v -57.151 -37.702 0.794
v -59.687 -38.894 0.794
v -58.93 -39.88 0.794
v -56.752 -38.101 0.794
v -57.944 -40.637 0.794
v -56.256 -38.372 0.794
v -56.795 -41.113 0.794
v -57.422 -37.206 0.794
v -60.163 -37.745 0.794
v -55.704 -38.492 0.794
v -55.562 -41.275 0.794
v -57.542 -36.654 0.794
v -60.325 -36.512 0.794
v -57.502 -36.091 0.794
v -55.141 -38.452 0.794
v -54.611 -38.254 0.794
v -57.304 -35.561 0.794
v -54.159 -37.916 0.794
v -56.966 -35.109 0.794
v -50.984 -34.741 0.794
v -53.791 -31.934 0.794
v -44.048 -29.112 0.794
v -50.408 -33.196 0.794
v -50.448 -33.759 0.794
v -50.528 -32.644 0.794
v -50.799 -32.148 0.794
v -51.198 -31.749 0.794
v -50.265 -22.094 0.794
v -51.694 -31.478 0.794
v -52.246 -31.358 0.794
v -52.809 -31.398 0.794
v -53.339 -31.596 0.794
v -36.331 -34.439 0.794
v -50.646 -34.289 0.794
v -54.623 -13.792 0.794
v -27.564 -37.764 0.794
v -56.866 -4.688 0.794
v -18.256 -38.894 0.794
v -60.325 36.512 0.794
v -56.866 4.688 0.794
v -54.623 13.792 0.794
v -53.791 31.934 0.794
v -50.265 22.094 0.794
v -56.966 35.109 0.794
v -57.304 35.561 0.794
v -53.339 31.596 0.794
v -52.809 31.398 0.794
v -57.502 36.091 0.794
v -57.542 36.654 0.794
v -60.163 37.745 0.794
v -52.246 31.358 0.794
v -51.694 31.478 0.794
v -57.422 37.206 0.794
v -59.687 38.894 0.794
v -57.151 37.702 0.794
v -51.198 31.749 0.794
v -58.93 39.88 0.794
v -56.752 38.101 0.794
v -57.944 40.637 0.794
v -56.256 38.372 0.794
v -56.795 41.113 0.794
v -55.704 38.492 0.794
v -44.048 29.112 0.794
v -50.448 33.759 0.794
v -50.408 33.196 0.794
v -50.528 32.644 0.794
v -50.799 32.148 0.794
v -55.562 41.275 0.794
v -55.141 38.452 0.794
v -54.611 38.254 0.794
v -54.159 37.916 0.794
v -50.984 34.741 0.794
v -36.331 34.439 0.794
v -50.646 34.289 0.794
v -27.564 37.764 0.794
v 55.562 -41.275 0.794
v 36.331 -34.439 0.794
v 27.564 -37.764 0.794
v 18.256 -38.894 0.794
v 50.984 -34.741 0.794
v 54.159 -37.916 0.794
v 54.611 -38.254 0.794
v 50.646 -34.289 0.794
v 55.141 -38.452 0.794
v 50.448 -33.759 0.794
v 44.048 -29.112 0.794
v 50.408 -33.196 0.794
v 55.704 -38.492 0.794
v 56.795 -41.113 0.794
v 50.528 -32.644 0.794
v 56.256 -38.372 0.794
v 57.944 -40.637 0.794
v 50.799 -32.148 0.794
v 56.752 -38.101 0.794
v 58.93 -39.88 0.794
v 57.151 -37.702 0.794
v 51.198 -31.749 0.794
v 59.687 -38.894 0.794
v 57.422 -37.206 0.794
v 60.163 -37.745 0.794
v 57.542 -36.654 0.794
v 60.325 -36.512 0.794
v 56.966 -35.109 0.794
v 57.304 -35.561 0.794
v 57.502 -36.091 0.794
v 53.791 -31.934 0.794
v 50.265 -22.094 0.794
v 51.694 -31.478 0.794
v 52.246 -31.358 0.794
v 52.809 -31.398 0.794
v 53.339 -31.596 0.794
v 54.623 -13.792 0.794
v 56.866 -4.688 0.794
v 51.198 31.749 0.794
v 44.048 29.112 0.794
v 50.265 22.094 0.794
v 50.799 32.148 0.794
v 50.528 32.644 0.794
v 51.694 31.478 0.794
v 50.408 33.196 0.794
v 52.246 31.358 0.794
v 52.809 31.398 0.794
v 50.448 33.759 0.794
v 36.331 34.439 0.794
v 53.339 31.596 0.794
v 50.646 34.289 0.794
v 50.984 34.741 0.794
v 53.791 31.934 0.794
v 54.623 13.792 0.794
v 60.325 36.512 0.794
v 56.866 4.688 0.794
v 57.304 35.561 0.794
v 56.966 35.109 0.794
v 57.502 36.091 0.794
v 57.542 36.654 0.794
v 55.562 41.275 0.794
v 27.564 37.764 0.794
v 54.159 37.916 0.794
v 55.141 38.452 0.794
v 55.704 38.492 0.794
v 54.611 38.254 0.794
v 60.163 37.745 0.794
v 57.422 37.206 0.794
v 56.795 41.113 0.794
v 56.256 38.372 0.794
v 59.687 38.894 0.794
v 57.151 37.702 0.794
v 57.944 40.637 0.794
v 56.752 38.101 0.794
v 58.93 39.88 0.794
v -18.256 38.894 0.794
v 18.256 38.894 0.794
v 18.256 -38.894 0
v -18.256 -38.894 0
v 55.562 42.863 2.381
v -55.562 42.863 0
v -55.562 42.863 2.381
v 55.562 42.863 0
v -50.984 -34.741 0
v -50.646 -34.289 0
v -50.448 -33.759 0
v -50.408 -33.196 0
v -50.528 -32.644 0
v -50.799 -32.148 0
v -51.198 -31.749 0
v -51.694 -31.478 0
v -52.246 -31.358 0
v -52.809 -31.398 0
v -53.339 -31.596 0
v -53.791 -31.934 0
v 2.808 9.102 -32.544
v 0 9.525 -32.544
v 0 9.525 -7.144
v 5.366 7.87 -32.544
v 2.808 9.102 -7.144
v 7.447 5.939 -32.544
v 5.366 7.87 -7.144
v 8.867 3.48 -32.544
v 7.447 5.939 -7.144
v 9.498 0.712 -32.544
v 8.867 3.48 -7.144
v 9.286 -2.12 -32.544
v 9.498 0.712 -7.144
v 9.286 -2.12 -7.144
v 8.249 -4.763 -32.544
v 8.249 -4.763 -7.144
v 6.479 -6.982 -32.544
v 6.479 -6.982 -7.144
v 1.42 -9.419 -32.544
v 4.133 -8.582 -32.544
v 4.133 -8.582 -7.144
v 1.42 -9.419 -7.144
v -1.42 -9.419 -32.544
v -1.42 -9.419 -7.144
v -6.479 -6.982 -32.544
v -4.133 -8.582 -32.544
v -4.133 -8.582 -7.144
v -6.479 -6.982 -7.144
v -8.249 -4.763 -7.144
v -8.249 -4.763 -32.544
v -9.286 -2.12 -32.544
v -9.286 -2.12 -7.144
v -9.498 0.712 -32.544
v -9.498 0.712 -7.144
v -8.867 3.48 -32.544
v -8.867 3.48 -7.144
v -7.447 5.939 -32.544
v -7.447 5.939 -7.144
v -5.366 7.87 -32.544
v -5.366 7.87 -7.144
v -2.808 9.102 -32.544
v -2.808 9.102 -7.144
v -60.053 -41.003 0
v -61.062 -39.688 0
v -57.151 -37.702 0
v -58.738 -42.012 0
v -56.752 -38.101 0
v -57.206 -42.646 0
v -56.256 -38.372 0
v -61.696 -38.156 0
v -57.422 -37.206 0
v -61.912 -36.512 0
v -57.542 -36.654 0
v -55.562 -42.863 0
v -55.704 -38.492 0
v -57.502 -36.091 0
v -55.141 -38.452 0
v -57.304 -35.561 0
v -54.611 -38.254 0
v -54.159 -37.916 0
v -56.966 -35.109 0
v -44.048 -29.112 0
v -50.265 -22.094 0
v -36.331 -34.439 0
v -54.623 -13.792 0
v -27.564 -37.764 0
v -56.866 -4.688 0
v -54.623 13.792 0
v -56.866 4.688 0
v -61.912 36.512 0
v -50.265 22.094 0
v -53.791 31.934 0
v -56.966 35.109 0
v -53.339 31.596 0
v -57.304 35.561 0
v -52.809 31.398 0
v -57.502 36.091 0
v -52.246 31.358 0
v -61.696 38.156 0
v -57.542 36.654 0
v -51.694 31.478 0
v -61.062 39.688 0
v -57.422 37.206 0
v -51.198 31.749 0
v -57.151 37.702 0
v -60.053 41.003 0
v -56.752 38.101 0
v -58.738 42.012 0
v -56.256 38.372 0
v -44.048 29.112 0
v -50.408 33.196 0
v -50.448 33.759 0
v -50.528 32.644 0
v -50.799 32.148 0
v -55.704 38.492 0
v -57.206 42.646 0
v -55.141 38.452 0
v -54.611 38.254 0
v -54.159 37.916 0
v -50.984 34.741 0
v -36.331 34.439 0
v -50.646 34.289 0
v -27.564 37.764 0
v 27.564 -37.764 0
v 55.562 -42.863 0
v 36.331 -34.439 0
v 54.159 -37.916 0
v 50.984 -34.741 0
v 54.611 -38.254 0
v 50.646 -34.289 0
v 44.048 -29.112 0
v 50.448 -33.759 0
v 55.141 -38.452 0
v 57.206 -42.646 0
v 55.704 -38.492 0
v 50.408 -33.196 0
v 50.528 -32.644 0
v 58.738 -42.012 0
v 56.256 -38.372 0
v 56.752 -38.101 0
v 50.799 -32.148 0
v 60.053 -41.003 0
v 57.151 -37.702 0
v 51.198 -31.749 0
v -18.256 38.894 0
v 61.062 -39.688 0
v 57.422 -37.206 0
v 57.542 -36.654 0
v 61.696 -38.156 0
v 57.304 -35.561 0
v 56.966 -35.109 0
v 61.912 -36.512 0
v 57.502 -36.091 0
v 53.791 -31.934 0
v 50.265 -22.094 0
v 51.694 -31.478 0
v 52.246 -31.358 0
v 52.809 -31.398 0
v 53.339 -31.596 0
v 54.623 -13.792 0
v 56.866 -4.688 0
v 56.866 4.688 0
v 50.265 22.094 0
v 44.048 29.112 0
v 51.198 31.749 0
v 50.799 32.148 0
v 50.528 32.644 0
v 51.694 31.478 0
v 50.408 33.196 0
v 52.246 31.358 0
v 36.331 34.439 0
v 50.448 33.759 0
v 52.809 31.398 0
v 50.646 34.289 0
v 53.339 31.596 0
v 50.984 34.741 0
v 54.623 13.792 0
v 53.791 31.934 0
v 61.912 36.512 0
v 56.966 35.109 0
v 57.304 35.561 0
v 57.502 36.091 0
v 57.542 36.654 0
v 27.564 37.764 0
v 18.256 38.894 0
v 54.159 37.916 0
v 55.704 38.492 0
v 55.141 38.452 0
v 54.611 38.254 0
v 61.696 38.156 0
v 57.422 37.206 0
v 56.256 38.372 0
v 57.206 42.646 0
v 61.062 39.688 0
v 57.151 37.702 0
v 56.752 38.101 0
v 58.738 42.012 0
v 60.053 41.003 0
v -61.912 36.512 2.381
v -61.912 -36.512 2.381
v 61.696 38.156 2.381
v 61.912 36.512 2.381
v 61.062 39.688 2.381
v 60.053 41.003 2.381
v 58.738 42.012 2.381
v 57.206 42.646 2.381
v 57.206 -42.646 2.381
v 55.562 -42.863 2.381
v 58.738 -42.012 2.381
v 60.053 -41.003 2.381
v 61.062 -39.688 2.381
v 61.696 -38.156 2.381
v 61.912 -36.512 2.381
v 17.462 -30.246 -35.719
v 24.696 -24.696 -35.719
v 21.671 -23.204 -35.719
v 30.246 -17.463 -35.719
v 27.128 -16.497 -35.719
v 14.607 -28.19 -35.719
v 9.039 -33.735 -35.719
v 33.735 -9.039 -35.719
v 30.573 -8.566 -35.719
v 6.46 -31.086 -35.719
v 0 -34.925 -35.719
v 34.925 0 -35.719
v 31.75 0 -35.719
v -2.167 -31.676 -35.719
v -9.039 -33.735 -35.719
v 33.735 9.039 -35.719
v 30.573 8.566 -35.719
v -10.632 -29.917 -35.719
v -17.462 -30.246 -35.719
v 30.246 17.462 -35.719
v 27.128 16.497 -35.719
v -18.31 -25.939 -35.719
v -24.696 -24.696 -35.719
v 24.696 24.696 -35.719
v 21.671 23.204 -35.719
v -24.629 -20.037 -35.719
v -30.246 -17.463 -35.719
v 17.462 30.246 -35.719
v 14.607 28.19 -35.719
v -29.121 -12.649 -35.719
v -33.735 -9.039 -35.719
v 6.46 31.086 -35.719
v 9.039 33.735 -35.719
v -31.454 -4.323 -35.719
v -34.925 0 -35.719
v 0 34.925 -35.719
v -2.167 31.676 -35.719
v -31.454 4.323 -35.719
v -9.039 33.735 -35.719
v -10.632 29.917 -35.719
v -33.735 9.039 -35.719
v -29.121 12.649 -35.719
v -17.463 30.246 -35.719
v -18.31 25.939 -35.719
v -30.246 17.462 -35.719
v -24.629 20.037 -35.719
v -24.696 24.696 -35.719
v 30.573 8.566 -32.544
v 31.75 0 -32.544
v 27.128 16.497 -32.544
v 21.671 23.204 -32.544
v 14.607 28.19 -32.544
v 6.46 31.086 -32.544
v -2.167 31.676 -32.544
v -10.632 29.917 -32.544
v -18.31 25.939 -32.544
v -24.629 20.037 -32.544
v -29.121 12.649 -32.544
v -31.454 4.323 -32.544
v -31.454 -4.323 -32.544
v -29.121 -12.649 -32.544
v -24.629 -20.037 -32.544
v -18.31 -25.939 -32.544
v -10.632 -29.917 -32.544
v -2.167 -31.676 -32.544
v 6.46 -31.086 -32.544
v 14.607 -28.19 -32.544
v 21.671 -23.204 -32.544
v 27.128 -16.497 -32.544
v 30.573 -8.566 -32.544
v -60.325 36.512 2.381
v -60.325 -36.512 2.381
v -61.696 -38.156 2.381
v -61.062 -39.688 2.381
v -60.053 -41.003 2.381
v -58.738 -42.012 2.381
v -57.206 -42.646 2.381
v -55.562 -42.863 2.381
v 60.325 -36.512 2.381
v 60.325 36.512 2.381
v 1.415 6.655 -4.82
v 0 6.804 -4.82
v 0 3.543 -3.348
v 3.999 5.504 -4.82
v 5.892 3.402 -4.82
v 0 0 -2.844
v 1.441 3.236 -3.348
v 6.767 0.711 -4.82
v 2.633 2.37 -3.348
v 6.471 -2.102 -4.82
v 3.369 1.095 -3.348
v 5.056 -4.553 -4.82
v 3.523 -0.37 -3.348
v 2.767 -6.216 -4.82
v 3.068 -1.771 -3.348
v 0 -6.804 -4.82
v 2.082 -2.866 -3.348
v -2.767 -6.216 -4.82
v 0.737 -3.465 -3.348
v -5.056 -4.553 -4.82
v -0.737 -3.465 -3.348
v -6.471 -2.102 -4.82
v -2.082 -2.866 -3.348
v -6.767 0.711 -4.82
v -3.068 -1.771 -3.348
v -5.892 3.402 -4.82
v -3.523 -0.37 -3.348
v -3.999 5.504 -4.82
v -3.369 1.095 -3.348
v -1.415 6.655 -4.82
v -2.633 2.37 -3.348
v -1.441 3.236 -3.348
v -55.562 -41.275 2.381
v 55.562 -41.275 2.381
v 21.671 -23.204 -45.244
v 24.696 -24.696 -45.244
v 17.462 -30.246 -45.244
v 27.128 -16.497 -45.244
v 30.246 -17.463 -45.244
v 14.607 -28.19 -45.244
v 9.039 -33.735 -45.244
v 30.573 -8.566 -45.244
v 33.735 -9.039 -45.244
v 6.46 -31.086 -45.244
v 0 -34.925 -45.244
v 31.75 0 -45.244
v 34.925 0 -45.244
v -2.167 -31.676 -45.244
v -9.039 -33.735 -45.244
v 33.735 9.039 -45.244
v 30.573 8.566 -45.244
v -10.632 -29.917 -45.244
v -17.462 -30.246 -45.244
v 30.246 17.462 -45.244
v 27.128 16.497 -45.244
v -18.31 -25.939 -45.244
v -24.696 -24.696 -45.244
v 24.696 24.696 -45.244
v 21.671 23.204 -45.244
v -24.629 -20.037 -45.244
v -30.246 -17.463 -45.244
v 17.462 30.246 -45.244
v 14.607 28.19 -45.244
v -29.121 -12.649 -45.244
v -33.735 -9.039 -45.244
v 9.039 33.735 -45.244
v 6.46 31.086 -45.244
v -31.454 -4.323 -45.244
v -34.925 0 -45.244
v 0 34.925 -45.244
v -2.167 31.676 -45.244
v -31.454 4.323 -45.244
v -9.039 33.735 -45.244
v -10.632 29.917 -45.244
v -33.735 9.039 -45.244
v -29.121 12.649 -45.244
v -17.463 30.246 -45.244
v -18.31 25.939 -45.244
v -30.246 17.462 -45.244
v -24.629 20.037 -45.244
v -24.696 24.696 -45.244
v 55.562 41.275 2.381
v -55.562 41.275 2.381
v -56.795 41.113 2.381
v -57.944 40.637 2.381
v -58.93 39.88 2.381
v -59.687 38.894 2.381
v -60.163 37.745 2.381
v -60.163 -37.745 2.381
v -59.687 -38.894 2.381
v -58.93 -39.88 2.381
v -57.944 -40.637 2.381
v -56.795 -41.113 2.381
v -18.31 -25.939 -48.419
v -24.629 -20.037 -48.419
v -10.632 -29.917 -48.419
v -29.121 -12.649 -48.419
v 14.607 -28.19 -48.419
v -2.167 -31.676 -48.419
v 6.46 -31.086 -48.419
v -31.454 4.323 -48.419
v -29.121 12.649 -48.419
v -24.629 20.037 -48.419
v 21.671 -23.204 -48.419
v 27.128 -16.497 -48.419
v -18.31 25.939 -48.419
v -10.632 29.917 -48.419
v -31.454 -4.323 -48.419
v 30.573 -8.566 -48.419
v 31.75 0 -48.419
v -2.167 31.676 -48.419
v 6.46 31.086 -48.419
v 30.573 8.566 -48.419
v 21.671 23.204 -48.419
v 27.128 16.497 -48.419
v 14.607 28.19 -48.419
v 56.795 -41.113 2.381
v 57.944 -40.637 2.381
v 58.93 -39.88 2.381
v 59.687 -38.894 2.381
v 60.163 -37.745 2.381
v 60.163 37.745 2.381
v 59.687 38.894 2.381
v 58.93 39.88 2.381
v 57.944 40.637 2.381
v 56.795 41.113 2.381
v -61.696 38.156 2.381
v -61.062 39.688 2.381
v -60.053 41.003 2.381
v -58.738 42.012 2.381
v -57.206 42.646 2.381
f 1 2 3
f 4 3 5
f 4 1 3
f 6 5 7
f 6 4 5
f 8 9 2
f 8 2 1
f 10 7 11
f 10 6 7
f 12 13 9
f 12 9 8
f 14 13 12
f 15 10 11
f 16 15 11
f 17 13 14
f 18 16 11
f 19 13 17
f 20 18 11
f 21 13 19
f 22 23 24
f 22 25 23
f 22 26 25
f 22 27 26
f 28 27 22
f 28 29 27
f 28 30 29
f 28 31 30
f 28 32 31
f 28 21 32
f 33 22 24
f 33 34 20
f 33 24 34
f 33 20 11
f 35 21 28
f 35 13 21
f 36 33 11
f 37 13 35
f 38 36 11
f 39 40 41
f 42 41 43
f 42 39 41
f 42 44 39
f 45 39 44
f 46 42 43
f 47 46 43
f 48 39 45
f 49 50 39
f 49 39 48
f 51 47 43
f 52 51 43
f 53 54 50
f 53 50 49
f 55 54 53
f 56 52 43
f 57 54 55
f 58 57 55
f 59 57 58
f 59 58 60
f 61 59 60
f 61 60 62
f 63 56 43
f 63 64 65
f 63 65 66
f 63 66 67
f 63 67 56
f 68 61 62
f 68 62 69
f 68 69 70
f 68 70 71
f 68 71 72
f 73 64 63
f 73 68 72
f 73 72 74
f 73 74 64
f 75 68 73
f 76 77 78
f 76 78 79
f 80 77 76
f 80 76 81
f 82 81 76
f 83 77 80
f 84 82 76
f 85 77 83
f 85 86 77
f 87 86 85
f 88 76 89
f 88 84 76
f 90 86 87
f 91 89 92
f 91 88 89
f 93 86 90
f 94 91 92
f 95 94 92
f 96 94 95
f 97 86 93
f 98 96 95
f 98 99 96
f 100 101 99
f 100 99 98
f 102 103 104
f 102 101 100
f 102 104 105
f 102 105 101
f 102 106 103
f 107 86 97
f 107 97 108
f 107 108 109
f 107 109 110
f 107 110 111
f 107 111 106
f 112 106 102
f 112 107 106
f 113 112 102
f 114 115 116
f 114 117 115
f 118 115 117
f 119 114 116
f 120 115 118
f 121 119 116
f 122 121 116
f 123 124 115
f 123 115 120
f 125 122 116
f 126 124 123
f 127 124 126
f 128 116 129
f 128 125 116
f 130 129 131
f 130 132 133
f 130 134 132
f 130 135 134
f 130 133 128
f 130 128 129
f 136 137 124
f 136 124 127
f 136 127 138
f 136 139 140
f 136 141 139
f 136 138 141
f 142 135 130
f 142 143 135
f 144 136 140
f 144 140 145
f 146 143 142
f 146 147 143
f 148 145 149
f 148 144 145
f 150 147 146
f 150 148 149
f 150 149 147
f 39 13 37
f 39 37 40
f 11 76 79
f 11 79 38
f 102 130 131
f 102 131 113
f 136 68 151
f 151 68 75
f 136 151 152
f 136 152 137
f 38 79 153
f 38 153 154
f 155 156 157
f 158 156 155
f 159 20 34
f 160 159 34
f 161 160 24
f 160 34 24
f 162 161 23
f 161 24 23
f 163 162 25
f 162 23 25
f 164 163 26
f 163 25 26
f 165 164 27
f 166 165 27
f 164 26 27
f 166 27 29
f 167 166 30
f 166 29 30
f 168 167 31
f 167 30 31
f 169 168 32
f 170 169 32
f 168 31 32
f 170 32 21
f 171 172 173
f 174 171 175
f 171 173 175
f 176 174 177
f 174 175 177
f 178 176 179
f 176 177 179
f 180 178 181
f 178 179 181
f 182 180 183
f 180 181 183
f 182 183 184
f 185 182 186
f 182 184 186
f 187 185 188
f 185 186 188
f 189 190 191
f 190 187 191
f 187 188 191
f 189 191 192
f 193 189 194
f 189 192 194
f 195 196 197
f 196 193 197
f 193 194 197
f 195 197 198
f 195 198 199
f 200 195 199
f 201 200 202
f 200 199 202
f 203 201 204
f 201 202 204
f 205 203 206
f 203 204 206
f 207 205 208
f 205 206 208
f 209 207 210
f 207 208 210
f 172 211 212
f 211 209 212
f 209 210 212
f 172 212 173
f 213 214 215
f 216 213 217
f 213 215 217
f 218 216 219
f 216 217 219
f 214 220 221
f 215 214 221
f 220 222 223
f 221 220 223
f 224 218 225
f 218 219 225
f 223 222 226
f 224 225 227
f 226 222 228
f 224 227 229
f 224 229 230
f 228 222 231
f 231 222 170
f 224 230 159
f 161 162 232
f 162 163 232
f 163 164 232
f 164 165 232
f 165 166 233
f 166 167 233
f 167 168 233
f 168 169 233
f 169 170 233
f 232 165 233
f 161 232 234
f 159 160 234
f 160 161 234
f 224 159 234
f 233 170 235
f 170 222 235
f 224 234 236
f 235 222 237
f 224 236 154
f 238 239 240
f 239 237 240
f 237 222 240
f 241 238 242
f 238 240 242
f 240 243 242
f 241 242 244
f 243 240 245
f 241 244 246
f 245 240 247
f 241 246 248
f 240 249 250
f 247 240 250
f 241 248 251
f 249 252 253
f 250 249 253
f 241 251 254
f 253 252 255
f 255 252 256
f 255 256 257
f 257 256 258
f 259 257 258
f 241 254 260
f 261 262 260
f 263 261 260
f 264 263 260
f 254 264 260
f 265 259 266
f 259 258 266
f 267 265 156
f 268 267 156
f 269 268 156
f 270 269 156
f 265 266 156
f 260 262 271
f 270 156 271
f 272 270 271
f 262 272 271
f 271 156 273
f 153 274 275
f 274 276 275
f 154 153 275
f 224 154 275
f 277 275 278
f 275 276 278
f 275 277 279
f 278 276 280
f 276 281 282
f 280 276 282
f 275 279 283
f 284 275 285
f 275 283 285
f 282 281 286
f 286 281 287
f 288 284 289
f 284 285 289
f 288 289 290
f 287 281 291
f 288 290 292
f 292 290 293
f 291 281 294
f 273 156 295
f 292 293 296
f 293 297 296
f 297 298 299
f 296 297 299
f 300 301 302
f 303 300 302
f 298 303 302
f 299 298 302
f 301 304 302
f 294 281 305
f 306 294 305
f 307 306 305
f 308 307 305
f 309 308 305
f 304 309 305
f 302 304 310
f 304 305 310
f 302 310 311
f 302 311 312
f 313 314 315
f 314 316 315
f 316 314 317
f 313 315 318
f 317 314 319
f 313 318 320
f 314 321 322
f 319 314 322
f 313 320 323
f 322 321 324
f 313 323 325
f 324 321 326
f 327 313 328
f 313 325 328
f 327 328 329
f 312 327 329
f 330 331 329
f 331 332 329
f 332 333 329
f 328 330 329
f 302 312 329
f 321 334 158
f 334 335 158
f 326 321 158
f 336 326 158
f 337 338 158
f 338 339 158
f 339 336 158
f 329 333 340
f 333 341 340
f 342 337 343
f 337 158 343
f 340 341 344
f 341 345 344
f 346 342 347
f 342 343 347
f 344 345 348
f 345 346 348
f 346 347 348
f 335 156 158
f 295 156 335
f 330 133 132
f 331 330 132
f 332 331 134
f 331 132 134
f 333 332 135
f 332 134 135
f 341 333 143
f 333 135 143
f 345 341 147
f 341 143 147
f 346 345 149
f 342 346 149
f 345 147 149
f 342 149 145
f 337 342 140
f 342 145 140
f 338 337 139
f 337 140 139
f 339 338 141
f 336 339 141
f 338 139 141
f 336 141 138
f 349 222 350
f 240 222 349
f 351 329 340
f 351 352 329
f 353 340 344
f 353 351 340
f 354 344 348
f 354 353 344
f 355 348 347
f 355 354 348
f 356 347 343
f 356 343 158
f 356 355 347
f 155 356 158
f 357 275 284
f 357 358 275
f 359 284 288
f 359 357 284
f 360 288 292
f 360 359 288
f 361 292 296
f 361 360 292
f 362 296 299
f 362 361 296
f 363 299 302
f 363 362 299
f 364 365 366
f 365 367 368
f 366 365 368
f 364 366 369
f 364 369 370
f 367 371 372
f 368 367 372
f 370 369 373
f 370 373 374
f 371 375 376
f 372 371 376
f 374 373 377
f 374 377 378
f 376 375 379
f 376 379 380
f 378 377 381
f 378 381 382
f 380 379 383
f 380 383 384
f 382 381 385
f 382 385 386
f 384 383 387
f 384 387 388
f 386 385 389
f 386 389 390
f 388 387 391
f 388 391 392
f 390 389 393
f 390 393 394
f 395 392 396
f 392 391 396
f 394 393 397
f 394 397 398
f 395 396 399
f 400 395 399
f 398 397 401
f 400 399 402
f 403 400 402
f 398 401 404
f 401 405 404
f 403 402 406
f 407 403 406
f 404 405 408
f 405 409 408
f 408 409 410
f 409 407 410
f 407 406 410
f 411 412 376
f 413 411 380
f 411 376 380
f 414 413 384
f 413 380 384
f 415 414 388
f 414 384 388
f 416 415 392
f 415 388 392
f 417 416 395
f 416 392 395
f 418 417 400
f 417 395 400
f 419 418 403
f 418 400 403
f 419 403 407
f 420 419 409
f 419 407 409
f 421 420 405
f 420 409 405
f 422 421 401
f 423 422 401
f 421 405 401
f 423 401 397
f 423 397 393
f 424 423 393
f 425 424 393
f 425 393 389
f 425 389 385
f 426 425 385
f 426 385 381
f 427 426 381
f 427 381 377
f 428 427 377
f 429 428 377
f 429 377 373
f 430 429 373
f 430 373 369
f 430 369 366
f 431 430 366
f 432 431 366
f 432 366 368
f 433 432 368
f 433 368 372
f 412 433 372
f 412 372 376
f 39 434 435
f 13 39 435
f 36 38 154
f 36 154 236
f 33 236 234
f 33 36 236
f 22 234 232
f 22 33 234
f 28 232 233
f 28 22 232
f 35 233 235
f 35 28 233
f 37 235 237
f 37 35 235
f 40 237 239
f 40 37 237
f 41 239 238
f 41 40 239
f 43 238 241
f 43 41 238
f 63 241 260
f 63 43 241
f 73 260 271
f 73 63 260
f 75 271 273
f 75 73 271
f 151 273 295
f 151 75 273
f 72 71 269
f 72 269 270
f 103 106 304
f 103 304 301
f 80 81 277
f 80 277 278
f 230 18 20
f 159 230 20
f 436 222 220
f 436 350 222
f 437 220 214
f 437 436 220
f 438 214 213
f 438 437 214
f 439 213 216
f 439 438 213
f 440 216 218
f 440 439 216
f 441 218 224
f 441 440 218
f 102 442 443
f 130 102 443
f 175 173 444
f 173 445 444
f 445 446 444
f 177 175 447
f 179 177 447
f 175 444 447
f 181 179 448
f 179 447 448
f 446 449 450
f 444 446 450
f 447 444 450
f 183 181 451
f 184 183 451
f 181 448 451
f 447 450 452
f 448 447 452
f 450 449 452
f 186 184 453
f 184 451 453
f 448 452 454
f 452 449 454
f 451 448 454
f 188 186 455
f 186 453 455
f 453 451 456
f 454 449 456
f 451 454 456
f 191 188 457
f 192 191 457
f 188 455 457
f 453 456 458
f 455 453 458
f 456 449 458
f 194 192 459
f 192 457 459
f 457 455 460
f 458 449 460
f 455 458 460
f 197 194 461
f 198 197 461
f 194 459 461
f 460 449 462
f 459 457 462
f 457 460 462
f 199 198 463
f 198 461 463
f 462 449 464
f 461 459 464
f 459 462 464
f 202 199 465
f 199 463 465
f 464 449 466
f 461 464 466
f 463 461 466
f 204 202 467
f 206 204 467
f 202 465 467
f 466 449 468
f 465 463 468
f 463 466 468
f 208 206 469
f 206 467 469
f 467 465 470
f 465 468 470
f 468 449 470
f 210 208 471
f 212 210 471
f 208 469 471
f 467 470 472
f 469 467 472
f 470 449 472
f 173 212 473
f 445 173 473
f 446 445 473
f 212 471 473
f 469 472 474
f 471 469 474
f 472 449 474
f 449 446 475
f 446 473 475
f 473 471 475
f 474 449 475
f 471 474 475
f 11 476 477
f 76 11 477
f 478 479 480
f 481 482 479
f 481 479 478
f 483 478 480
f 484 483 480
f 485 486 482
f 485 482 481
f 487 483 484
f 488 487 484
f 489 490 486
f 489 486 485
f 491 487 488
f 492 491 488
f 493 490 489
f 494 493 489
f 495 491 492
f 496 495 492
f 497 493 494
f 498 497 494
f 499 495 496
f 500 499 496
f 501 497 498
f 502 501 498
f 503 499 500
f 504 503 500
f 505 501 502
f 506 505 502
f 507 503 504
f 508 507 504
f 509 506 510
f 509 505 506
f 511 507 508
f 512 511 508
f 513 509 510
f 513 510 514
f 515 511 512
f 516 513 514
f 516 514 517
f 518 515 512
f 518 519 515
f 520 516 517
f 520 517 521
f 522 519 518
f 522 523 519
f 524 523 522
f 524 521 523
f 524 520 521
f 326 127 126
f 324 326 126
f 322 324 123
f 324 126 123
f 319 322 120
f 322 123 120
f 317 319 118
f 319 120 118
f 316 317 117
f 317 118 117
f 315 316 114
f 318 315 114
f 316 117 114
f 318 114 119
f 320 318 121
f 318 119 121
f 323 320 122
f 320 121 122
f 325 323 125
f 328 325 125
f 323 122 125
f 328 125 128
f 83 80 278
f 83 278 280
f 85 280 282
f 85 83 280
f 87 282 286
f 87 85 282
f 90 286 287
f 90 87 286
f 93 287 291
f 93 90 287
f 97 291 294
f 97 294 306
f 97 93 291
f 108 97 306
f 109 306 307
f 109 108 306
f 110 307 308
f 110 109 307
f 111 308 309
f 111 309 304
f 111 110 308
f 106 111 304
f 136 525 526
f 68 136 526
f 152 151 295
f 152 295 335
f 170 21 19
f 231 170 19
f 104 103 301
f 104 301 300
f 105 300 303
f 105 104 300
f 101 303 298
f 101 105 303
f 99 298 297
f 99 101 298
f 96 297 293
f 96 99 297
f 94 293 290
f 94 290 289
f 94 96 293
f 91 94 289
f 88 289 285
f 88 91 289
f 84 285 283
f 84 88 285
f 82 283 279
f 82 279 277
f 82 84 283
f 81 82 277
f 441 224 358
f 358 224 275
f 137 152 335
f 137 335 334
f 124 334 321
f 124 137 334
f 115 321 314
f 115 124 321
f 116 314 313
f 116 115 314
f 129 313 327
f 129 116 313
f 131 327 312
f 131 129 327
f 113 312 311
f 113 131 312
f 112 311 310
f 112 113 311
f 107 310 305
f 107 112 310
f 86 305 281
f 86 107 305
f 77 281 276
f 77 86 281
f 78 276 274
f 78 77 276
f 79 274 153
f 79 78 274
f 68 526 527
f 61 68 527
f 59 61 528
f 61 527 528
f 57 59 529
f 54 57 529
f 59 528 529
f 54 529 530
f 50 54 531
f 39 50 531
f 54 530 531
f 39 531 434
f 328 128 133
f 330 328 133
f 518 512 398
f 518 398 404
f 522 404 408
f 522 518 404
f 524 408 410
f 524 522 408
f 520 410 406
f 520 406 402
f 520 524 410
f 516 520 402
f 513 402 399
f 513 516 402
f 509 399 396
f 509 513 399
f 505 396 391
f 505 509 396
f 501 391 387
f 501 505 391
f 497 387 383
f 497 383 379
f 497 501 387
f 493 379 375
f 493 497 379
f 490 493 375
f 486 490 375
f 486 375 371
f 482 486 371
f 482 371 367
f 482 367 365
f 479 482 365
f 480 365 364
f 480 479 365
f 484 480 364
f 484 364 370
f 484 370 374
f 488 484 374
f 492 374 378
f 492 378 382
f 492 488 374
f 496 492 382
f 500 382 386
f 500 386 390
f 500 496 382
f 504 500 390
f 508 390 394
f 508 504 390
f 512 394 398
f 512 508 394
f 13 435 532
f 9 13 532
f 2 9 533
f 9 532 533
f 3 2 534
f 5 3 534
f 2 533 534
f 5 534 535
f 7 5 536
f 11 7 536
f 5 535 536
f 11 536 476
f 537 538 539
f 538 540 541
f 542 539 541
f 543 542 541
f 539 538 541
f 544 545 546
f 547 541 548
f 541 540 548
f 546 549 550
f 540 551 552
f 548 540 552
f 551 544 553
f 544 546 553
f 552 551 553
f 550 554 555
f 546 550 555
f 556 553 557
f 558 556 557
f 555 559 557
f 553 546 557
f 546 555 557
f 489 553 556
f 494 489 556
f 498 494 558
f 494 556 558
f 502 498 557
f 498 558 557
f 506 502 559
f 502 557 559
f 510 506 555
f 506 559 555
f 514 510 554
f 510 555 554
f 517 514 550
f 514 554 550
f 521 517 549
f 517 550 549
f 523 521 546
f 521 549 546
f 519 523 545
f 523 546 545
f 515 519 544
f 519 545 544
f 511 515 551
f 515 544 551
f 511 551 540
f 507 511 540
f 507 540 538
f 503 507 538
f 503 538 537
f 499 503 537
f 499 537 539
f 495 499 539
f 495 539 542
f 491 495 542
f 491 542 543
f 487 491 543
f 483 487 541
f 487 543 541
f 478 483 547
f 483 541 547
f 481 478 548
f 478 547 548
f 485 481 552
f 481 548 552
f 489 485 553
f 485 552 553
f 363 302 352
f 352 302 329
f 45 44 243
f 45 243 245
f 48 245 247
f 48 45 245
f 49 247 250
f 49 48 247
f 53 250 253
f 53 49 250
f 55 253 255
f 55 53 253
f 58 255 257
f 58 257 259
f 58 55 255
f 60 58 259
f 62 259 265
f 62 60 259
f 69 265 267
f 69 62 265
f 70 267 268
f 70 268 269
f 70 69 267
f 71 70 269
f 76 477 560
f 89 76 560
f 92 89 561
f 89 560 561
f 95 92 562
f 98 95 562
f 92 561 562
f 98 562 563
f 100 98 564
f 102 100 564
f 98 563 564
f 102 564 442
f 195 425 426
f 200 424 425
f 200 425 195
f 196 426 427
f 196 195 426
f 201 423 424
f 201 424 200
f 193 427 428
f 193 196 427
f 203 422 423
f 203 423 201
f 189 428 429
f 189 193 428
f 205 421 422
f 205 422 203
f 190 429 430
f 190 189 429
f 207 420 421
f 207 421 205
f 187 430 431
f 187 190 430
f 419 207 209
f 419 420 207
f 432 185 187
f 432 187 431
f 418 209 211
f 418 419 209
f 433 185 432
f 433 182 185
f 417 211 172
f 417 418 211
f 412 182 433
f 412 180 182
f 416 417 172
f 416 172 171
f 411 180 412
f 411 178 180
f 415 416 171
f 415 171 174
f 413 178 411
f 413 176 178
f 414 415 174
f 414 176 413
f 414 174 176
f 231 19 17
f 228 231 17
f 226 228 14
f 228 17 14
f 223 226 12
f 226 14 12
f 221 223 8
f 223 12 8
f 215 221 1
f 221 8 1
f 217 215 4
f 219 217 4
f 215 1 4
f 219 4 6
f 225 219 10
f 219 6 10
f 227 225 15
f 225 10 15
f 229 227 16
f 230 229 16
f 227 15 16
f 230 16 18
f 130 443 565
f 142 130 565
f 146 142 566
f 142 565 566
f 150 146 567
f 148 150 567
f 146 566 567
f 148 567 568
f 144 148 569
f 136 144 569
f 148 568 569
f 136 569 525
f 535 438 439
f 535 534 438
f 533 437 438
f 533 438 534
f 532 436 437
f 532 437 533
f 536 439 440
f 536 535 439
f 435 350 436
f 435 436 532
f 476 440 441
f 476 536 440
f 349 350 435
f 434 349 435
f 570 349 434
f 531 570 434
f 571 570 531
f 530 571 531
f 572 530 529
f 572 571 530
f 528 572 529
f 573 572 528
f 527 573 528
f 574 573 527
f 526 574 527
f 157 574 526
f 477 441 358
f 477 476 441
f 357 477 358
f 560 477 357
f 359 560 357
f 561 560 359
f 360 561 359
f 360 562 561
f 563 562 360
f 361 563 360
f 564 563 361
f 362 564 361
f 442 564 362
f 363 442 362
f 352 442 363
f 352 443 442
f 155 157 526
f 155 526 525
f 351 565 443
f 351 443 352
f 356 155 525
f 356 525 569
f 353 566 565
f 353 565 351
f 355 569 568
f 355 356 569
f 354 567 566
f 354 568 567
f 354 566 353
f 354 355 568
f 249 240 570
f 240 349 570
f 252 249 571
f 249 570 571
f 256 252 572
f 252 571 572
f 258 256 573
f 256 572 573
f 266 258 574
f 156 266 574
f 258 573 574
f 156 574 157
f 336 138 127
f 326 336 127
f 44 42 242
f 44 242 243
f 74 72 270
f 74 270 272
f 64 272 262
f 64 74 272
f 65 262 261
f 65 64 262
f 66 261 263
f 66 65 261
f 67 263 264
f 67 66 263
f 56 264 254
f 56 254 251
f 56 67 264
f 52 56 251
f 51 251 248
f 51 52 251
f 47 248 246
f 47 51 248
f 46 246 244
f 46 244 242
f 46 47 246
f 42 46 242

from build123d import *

# Parameters (mm, degrees)
SKETCH1_W           = 123.825
SKETCH1_H           = 85.725
BOSS_EXTRUDE1_DEPTH = 2.38125
FILLET1_R           = 6.35
CUT_EXTRUDE1_DEPTH  = 1.5875
CUT_EXTRUDE2_REACH  = 77.318
SKETCH6_R           = 31.75
BOSS_EXTRUDE2_DEPTH = 15.875
BOSS_EXTRUDE3_START = -3.175
SKETCH19_R          = 34.925
BOSS_EXTRUDE3_DEPTH = 9.525
CUT_EXTRUDE3_DEPTH  = 0.79375


with BuildPart() as part:
    # Sketch1 → Boss-Extrude1 (new body)
    with BuildSketch(Plane.XY):
        Rectangle(SKETCH1_W, SKETCH1_H)
    extrude(amount=BOSS_EXTRUDE1_DEPTH)

    # Fillet1
    fillet1_edges = [part.edges().sort_by_distance(p)[0] for p in [
        (61.9125, -42.8625, 1.190625),
        (-61.9125, -42.8625, 1.190625),
        (-61.9125, 42.8625, 1.190625),
        (61.9125, 42.8625, 1.190625),
    ]]
    fillet(fillet1_edges, radius=FILLET1_R)

    # Sketch2 → Cut-Extrude1 (cut)
    with BuildSketch(Plane.XY.offset(2.38125)):
        with BuildLine():
            Line((-60.325, 36.5125), (-60.325, -36.5125))
            ThreePointArc((-60.325, -36.5125), (-58.930096045, -39.880096045), (-55.5625, -41.275))
            Line((-55.5625, -41.275), (55.5625, -41.275))
            ThreePointArc((55.5625, -41.275), (58.930096045, -39.880096045), (60.325, -36.5125))
            Line((60.325, -36.5125), (60.325, 36.5125))
            ThreePointArc((60.325, 36.5125), (58.930096045, 39.880096045), (55.5625, 41.275))
            Line((55.5625, 41.275), (-55.5625, 41.275))
            ThreePointArc((-55.5625, 41.275), (-58.930096045, 39.880096045), (-60.325, 36.5125))
        make_face()
    extrude(amount=-CUT_EXTRUDE1_DEPTH, mode=Mode.SUBTRACT)

    # Sketch3 → Cut-Extrude2 (cut, up to next)
    with BuildSketch(Plane.XY.offset(0.79375), mode=Mode.PRIVATE) as cut_extrude2_sk1:
        with BuildLine():
            Line((-18.25625, 38.89375), (18.25625, 38.89375))
            ThreePointArc((18.25625, 38.89375), (57.15, 0), (18.25625, -38.89375))
            Line((18.25625, -38.89375), (-18.25625, -38.89375))
            ThreePointArc((-18.25625, -38.89375), (-57.15, 0), (-18.25625, 38.89375))
        make_face()
    cut_extrude2_tool1 = extrude(cut_extrude2_sk1.sketch, amount=-CUT_EXTRUDE2_REACH, mode=Mode.PRIVATE) & part.part
    add(cut_extrude2_tool1.solids().sort_by_distance((0, 0, 0.79375))[0], mode=Mode.SUBTRACT)

    # Sketch20 → Cut-Extrude3 (cut)
    with BuildSketch(Plane.XY.offset(0.79375)):
        with BuildLine():
            Line((-54.159334981, 37.915665019), (-50.984334981, 34.740665019))
            ThreePointArc((-50.984334981, 34.740665019), (-50.984334981, 31.934334981), (-53.790665019, 31.934334981))
            Line((-53.790665019, 31.934334981), (-56.965665019, 35.109334981))
            ThreePointArc((-56.965665019, 35.109334981), (-56.965665019, 37.915665019), (-54.159334981, 37.915665019))
        make_face()
        with BuildLine():
            Line((54.159334981, 37.915665019), (50.984334981, 34.740665019))
            ThreePointArc((50.984334981, 34.740665019), (50.984334981, 31.934334981), (53.790665019, 31.934334981))
            Line((53.790665019, 31.934334981), (56.965665019, 35.109334981))
            ThreePointArc((56.965665019, 35.109334981), (56.965665019, 37.915665019), (54.159334981, 37.915665019))
        make_face()
        with BuildLine():
            Line((-54.159334981, -37.915665019), (-50.984334981, -34.740665019))
            ThreePointArc((-50.984334981, -34.740665019), (-50.984334981, -31.934334981), (-53.790665019, -31.934334981))
            Line((-53.790665019, -31.934334981), (-56.965665019, -35.109334981))
            ThreePointArc((-56.965665019, -35.109334981), (-56.965665019, -37.915665019), (-54.159334981, -37.915665019))
        make_face()
        with BuildLine():
            Line((54.159334981, -37.915665019), (50.984334981, -34.740665019))
            ThreePointArc((50.984334981, -34.740665019), (50.984334981, -31.934334981), (53.790665019, -31.934334981))
            Line((53.790665019, -31.934334981), (56.965665019, -35.109334981))
            ThreePointArc((56.965665019, -35.109334981), (56.965665019, -37.915665019), (54.159334981, -37.915665019))
        make_face()
    extrude(amount=-CUT_EXTRUDE3_DEPTH, mode=Mode.SUBTRACT)


with BuildPart() as body_2:
    # Sketch5 → Revolve1 (revolve)
    with BuildSketch(Plane(origin=(0, 0, 0), x_dir=(0, 0, -1), z_dir=(1, 0, 0))):
        with BuildLine():
            Line((48.41875, 0), (48.41875, 9.525))
            Line((48.41875, 9.525), (7.14375, 9.525))
            ThreePointArc((7.14375, 9.525), (3.96875, 5.225260413), (2.844010413, 0))
            Line((2.844010413, 0), (48.41875, 0))
        make_face()
    revolve(axis=Axis((0, 0, 0), (0, 0, -1)))

    # Sketch6 → Boss-Extrude2 (add)
    with BuildSketch(Plane.XY.offset(-48.41875)):
        Circle(SKETCH6_R)
    extrude(amount=BOSS_EXTRUDE2_DEPTH)

    # Sketch19 → Boss-Extrude3 (add)
    with BuildSketch(Plane(origin=(0, 0, -48.41875), x_dir=(-1, 0, 0), z_dir=(0, 0, -1)).offset(BOSS_EXTRUDE3_START)):
        Circle(SKETCH19_R)
    extrude(amount=-BOSS_EXTRUDE3_DEPTH)


solid = Compound([part.part, body_2.part])
